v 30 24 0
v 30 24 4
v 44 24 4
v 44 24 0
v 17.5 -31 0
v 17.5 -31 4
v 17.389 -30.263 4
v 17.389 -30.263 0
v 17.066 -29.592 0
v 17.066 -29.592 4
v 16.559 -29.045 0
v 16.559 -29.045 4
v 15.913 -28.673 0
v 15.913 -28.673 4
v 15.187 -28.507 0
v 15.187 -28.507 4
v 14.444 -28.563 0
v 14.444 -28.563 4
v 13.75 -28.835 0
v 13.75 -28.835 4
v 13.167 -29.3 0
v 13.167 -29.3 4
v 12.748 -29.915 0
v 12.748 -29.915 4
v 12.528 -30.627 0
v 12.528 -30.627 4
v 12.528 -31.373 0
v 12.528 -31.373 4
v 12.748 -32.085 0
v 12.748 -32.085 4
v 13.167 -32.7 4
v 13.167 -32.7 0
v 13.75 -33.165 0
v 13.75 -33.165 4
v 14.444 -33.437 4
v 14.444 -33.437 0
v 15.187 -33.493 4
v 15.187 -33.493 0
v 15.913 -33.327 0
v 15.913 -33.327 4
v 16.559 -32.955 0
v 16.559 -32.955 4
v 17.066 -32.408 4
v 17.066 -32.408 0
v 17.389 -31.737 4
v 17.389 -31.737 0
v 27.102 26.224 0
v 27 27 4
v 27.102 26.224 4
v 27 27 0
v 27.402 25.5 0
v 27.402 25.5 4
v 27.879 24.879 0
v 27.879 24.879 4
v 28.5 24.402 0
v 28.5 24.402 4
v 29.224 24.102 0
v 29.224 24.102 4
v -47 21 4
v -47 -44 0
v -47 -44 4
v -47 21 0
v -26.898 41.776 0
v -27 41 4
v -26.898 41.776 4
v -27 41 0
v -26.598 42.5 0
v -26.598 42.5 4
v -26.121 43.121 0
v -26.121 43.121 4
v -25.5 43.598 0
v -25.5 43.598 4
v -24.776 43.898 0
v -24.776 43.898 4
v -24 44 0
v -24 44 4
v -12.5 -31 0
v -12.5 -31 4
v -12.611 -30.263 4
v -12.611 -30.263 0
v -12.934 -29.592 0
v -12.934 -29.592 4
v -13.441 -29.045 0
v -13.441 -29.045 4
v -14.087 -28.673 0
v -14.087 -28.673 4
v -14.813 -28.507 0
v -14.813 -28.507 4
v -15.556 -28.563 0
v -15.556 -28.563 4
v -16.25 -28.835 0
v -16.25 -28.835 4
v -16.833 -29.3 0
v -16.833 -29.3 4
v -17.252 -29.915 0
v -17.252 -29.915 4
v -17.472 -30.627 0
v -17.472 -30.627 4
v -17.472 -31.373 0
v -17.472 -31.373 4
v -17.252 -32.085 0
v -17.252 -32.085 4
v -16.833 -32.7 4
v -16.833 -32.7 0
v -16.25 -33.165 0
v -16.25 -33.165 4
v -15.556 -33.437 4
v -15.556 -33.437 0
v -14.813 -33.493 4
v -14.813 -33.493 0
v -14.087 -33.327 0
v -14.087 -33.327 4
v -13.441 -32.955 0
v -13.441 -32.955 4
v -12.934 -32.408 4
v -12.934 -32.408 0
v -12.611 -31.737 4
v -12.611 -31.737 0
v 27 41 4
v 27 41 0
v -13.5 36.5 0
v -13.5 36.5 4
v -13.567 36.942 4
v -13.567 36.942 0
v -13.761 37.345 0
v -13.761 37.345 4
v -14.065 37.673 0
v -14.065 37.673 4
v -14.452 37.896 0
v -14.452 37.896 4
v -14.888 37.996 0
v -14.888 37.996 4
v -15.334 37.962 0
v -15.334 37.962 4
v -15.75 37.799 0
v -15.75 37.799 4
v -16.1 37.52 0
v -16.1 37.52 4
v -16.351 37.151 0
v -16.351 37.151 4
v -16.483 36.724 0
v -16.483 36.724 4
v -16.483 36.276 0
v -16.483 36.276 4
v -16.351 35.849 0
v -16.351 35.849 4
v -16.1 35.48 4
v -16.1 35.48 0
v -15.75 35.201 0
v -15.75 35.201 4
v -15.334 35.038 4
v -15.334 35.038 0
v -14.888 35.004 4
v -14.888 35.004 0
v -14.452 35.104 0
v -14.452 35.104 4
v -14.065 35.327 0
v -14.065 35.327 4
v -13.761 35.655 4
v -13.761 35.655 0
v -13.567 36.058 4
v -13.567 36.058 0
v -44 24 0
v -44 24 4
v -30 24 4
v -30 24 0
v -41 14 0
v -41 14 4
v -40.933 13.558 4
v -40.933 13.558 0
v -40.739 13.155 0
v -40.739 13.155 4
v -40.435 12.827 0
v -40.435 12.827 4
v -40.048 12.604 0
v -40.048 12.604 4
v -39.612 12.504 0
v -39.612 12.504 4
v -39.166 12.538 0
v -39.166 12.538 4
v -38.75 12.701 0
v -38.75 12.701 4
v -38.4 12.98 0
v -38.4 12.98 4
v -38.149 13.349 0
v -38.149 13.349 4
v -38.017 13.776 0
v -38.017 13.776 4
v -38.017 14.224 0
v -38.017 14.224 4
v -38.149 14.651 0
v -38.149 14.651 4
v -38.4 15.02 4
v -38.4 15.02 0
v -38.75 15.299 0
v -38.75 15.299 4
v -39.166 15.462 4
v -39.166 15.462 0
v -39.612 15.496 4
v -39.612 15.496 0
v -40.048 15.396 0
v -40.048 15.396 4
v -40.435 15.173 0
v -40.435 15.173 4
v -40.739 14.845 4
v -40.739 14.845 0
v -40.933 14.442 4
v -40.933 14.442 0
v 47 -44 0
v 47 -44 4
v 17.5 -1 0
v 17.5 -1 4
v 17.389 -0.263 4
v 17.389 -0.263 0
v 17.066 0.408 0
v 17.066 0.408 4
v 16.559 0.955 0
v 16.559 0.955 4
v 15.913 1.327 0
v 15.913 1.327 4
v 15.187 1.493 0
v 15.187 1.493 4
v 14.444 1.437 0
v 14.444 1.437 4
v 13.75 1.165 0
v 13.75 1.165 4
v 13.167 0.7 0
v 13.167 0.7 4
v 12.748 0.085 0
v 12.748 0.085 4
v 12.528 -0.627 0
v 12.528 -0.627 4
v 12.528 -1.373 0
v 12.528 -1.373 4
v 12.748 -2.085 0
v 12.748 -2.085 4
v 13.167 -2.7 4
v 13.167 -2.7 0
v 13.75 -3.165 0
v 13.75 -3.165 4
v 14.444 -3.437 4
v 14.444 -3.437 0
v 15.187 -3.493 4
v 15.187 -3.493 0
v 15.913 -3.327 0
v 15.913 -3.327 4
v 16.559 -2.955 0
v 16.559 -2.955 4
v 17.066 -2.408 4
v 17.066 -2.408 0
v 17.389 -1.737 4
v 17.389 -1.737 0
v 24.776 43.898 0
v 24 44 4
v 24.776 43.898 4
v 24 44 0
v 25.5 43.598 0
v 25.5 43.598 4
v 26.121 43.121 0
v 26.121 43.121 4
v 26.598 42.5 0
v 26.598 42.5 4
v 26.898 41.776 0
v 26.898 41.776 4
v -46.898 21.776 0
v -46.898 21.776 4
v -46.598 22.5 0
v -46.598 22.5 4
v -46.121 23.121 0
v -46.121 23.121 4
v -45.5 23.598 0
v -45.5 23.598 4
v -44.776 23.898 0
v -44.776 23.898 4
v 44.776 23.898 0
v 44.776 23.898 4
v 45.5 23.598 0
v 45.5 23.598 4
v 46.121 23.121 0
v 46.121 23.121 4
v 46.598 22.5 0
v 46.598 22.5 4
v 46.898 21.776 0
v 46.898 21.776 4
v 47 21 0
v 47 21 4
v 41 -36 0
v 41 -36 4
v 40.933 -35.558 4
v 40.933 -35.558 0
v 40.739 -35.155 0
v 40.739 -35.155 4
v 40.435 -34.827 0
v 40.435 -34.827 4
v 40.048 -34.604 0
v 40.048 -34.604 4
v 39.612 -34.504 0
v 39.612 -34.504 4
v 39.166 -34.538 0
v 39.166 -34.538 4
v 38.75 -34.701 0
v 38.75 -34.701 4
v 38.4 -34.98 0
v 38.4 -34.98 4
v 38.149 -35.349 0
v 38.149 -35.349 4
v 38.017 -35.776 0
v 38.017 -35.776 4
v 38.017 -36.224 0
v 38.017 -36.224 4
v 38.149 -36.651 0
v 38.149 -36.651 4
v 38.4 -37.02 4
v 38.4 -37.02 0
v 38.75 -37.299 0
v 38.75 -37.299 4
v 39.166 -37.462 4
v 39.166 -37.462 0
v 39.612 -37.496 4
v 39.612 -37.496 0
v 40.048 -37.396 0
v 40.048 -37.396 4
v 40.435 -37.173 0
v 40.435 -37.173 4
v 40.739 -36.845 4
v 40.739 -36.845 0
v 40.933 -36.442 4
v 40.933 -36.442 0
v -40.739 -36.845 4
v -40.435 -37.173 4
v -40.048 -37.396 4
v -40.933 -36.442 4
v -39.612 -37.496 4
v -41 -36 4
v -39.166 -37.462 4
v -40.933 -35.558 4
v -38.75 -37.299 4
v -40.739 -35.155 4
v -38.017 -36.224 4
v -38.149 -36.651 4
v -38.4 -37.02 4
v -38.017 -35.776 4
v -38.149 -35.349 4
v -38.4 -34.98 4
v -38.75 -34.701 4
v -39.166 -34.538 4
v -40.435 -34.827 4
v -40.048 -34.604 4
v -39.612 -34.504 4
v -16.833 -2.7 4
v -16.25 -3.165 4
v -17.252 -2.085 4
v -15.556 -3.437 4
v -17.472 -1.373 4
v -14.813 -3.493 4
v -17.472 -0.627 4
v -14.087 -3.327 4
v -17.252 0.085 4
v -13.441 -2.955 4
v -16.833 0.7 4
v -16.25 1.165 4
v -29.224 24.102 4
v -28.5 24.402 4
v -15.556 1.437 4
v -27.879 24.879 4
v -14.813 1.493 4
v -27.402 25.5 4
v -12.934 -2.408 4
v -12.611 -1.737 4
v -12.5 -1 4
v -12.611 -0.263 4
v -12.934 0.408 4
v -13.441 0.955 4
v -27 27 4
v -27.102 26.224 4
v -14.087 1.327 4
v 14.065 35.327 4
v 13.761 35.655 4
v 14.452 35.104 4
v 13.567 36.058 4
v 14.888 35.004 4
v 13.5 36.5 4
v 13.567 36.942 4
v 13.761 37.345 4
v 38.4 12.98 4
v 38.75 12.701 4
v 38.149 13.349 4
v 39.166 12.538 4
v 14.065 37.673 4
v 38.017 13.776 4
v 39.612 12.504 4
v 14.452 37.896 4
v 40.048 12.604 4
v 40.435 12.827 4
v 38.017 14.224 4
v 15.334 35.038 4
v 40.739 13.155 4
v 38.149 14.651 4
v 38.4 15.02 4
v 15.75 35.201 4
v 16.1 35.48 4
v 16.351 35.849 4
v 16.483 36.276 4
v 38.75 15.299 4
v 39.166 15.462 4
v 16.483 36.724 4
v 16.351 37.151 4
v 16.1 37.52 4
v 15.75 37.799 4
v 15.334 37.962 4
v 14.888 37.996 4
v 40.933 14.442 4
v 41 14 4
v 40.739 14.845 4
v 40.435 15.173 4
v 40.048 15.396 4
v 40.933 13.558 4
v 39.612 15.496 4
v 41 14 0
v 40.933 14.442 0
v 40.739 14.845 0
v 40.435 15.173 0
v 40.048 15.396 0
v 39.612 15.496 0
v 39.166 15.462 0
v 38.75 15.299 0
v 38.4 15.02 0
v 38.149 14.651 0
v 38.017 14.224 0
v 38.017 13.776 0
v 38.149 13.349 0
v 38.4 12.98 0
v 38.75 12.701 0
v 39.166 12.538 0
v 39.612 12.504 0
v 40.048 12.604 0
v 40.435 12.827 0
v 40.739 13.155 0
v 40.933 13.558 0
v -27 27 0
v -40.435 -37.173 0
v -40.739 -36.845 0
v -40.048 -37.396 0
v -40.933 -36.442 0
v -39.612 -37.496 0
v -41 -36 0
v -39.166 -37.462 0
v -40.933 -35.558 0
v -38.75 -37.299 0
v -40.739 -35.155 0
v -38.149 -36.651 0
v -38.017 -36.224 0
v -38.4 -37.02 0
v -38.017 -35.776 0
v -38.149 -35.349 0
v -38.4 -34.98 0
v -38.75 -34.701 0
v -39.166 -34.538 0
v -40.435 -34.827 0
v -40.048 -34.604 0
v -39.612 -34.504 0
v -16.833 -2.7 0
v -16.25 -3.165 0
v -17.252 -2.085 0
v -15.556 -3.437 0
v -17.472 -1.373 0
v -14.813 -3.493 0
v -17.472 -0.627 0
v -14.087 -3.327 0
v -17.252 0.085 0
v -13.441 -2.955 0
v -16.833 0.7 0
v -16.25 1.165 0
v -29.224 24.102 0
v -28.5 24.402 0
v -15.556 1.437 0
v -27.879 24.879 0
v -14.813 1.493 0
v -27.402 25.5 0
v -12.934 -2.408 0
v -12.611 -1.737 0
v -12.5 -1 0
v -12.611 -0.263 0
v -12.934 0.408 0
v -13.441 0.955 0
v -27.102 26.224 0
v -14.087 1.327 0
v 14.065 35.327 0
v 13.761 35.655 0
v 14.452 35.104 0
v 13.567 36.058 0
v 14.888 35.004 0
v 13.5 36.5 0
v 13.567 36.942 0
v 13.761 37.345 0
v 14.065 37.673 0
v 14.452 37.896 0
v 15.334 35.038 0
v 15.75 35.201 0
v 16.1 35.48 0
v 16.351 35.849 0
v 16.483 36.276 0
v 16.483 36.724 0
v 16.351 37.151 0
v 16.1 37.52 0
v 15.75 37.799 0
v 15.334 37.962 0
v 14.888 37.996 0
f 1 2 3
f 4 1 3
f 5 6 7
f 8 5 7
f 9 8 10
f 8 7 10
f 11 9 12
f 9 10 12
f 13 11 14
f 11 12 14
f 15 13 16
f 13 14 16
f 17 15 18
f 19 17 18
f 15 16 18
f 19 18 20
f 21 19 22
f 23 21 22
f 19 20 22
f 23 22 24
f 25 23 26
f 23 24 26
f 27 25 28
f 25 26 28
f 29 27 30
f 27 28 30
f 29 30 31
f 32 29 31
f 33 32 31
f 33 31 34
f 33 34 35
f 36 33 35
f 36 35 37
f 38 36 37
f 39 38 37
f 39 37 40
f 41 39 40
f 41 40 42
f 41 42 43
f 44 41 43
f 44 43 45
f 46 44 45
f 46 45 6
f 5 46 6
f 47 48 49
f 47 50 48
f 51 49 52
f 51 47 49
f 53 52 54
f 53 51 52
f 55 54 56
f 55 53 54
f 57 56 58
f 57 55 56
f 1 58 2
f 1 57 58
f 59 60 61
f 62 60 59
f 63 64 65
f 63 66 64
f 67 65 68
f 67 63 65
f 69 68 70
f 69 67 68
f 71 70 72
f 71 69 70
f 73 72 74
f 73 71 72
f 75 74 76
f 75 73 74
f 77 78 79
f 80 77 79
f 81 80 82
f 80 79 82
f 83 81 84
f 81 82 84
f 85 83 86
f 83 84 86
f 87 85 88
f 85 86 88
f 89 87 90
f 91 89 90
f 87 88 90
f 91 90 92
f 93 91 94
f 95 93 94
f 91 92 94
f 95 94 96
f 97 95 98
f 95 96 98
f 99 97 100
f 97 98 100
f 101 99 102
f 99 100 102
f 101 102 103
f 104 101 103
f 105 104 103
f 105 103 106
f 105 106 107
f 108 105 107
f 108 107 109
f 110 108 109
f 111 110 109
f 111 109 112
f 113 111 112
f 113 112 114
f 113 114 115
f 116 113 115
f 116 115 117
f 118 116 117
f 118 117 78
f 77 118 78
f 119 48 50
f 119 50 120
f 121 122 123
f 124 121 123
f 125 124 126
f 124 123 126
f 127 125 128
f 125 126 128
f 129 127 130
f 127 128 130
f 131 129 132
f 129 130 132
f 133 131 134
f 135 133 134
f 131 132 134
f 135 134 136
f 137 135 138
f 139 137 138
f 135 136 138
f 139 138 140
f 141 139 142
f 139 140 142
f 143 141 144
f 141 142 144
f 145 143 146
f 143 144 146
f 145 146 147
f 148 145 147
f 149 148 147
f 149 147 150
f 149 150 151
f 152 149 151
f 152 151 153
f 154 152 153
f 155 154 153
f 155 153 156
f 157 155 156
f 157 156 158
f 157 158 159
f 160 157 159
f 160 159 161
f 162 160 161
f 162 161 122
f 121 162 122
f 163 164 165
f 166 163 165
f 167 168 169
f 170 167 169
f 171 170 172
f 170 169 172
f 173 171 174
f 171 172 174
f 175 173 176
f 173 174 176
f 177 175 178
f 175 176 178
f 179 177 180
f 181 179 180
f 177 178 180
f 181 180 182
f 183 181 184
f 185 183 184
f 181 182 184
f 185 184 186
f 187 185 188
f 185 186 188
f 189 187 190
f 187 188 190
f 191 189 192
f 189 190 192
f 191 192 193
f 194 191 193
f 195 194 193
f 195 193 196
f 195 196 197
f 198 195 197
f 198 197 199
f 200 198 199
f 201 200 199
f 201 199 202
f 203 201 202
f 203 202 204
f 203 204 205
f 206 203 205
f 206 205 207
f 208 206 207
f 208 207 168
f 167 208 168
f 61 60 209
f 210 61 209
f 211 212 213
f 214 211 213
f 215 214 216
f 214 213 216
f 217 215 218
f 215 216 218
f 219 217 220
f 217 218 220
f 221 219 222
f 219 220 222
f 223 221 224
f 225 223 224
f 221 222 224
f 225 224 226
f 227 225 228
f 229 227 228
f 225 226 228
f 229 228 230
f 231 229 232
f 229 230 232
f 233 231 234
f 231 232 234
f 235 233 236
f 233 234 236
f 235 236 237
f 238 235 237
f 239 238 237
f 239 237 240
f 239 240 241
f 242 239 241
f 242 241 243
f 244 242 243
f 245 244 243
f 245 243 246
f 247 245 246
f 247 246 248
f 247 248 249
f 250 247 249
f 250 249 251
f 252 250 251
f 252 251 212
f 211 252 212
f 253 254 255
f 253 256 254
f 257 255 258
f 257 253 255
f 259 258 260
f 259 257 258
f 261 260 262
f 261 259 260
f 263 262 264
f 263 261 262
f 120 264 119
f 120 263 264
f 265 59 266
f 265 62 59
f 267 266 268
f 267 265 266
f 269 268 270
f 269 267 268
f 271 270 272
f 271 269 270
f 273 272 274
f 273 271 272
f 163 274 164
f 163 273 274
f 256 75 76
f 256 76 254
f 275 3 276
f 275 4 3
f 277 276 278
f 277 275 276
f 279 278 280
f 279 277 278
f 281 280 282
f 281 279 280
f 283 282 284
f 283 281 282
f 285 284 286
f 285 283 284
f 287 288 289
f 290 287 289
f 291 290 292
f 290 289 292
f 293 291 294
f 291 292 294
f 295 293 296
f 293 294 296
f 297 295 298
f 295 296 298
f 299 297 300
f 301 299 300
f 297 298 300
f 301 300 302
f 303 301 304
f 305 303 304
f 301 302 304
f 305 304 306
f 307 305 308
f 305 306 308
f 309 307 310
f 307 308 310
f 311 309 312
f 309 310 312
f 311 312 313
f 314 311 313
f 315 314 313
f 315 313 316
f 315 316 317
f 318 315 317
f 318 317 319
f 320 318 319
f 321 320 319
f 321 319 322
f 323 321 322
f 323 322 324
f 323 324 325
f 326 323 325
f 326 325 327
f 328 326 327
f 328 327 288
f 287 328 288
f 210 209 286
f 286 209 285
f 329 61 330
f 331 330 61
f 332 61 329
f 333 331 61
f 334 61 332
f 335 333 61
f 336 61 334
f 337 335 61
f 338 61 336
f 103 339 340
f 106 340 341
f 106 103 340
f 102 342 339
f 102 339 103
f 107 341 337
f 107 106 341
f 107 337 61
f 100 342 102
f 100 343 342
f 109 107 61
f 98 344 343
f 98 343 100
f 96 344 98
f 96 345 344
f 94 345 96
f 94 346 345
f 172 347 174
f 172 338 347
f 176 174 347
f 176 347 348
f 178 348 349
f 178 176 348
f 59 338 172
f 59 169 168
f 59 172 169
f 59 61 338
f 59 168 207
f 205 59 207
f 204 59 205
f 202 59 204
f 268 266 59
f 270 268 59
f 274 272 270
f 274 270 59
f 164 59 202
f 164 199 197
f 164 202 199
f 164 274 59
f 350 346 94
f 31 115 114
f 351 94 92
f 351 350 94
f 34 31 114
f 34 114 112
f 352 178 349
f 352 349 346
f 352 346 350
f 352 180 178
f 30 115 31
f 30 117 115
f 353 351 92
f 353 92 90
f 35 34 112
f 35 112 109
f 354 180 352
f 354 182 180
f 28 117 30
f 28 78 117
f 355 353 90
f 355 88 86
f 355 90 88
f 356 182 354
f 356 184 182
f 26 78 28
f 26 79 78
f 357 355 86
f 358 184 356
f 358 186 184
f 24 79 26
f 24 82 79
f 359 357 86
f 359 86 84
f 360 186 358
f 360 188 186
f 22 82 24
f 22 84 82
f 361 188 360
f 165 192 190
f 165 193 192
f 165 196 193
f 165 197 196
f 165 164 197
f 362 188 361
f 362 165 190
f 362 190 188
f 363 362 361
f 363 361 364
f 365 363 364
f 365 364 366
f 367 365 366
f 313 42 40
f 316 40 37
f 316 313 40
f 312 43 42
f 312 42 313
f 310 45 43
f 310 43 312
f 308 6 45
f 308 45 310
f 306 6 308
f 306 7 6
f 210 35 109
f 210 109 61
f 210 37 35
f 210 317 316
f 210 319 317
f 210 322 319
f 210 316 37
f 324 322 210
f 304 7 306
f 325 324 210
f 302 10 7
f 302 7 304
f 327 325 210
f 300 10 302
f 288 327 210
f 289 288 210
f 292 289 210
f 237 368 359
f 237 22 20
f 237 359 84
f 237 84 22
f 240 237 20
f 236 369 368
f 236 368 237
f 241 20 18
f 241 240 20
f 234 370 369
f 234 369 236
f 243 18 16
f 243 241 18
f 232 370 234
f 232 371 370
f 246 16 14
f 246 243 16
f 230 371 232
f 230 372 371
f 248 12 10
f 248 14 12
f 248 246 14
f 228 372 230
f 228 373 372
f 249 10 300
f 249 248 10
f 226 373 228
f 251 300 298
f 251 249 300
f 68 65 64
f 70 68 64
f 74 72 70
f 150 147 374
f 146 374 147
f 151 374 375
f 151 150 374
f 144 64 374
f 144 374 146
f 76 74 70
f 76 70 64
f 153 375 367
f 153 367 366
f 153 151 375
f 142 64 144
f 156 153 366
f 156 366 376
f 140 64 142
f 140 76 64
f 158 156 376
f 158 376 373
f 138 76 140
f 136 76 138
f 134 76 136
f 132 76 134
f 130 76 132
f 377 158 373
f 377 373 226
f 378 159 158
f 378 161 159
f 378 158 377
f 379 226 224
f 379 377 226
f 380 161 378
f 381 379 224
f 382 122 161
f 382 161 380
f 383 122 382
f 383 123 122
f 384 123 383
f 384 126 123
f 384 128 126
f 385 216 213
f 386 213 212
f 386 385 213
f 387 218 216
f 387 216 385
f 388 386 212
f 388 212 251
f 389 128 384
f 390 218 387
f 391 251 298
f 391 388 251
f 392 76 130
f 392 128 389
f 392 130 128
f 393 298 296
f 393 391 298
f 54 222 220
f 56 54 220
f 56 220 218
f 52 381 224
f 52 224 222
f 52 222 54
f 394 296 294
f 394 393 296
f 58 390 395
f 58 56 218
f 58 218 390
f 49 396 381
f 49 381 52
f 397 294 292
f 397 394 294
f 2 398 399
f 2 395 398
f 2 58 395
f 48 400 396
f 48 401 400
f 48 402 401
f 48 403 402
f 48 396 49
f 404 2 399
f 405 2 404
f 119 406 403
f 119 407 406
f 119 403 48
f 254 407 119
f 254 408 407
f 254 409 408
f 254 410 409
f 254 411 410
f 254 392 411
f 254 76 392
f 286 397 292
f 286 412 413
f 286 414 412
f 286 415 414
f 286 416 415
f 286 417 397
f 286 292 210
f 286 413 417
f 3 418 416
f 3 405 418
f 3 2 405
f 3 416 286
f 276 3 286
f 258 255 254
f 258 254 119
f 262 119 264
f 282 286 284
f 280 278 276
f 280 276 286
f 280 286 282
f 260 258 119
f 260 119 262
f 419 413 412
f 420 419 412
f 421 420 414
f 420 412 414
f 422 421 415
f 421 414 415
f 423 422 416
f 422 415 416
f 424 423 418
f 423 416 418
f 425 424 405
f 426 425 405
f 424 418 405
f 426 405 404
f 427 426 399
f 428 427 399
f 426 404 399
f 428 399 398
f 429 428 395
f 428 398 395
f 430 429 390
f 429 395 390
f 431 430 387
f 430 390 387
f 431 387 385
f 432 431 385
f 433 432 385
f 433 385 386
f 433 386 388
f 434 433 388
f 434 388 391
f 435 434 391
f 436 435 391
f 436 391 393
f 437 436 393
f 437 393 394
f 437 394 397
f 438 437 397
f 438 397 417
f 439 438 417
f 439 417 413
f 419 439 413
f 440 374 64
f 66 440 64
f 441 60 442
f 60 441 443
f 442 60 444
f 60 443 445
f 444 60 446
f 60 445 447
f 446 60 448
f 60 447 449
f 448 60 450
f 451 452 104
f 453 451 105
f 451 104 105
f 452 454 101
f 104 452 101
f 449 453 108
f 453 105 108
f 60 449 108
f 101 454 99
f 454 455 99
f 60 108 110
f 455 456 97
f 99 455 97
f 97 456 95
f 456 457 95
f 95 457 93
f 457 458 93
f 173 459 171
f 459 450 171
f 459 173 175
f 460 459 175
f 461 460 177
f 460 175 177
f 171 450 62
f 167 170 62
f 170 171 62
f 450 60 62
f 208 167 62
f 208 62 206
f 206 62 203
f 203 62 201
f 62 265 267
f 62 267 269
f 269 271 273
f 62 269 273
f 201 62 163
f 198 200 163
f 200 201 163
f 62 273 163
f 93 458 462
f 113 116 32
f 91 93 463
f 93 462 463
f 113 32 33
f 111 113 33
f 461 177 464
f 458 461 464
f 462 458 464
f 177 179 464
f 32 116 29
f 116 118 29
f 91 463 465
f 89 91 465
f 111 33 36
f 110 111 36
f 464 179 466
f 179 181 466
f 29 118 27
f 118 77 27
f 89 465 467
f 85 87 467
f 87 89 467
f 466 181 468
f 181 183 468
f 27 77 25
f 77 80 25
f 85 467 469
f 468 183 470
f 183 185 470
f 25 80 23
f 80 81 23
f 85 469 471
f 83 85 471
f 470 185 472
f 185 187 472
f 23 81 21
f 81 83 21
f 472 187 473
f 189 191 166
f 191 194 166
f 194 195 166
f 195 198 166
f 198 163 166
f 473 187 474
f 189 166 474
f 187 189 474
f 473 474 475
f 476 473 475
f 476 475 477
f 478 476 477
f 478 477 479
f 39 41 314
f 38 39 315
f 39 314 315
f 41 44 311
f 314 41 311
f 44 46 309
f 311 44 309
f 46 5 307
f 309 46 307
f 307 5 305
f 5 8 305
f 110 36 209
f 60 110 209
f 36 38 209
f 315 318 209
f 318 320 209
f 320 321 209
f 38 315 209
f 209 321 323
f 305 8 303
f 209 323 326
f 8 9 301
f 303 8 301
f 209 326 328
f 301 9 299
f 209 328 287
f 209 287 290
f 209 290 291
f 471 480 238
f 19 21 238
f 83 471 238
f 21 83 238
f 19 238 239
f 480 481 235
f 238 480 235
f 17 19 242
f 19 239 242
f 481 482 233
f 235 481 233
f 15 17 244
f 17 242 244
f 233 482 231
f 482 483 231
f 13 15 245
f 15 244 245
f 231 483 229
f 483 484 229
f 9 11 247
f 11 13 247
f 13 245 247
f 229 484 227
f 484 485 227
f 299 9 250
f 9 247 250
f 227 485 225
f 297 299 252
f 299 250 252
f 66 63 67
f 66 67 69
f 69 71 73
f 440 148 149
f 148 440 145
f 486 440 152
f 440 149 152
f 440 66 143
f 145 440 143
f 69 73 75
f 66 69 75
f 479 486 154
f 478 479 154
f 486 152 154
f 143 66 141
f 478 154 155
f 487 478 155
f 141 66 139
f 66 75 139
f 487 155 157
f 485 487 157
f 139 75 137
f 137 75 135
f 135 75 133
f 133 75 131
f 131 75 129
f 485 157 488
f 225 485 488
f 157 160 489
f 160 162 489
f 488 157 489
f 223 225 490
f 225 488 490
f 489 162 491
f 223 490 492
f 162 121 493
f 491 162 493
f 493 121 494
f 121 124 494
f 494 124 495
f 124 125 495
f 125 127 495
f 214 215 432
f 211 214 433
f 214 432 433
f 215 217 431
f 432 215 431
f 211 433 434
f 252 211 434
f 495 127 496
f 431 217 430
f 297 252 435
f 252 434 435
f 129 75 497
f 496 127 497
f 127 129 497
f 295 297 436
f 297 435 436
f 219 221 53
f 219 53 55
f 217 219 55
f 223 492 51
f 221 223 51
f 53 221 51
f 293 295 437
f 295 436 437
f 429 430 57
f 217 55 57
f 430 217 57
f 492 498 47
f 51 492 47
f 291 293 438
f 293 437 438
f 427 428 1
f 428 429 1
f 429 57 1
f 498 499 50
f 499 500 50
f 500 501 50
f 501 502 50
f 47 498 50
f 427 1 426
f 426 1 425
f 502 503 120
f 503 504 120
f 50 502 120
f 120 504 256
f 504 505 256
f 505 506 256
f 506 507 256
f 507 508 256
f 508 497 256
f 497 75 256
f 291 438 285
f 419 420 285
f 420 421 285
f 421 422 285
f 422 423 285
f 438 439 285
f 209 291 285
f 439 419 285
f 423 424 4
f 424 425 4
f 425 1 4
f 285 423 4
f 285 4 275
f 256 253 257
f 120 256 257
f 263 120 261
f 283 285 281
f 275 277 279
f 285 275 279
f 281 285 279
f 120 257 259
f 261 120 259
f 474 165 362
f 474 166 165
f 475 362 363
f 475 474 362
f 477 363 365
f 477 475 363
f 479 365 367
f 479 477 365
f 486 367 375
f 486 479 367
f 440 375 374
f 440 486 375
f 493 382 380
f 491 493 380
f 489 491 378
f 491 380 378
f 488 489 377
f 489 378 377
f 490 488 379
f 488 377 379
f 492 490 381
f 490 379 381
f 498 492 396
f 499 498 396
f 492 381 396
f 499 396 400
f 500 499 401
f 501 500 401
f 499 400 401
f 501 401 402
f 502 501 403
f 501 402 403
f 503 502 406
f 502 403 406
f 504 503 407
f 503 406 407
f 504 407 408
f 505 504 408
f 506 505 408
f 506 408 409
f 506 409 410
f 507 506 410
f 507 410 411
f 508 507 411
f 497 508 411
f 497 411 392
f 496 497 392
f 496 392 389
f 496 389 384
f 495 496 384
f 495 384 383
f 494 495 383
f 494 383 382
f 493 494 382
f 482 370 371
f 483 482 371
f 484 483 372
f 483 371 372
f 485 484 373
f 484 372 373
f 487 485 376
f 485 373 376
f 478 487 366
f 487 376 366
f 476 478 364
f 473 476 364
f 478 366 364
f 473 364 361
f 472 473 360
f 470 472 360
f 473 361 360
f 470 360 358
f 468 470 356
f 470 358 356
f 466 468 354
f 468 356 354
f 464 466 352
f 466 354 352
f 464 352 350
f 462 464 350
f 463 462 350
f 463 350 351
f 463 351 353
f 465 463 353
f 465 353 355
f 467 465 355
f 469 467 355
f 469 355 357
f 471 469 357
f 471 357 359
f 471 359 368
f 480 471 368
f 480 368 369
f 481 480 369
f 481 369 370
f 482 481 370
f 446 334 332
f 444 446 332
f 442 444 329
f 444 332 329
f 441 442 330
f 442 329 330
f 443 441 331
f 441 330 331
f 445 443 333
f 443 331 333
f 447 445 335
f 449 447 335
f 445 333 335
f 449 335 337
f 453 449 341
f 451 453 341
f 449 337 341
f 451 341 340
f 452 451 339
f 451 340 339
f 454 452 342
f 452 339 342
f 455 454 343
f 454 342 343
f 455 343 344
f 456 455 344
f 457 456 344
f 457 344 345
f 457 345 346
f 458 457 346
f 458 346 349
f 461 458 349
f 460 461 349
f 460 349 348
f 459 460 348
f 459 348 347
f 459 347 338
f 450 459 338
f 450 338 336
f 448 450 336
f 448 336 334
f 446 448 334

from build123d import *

# Parameters (mm, degrees)
SKETCH_1_W          = 94
SKETCH_1_H          = 88
EXTRUDE_1_DEPTH     = 4
SKETCH_2_W          = 20
SKETCH_2_H          = 20
CUT_EXTRUDE_1_DEPTH = 65.505813691
FILLET_1_R          = 3
SKETCH_3_R          = 2.5
CUT_EXTRUDE_2_DEPTH = 65.505813691
SKETCH_4_R          = 1.5
CUT_EXTRUDE_3_DEPTH = 65.505813691


with BuildPart() as part:
    # 草图1 → 凸台-拉伸1 (new body)
    with BuildSketch(Plane.XY):
        Rectangle(SKETCH_1_W, SKETCH_1_H)
    extrude(amount=EXTRUDE_1_DEPTH)

    # 草图2 → 切除-拉伸1 (cut, through all)
    with BuildSketch(Plane.XY.offset(4)):
        with Locations((-37, 34)):
            Rectangle(SKETCH_2_W, SKETCH_2_H)
        with Locations((37, 34)):
            Rectangle(SKETCH_2_W, SKETCH_2_H)
    extrude(amount=-CUT_EXTRUDE_1_DEPTH, mode=Mode.SUBTRACT)

    # 圆角1
    fillet_1_edges = [part.edges().sort_by_distance(p)[0] for p in [
        (-47, 24, 2),
        (-27, 44, 2),
        (-27, 24, 2),
        (27, 44, 2),
        (47, 24, 2),
        (27, 24, 2),
    ]]
    fillet(fillet_1_edges, radius=FILLET_1_R)

    # 草图3 → 切除-拉伸2 (cut, through all)
    with BuildSketch(Plane.XY.offset(4)):
        with Locations((-15, -1)):
            Circle(SKETCH_3_R)
        with Locations((15, -1)):
            Circle(SKETCH_3_R)
        with Locations((15, -31)):
            Circle(SKETCH_3_R)
        with Locations((-15, -31)):
            Circle(SKETCH_3_R)
    extrude(amount=-CUT_EXTRUDE_2_DEPTH, mode=Mode.SUBTRACT)

    # 草图4 → 切除-拉伸3 (cut, through all)
    with BuildSketch(Plane.XY.offset(4)):
        with Locations((-15, 36.5)):
            Circle(SKETCH_4_R)
        with Locations((39.5, 14)):
            Circle(SKETCH_4_R)
        with Locations((39.5, -36)):
            Circle(SKETCH_4_R)
        with Locations(Location((15, 36.5, 0), (0, 0, 180))):
            Circle(SKETCH_4_R)
        with Locations(Location((-39.5, -36, 0), (0, 0, 180))):
            Circle(SKETCH_4_R)
        with Locations(Location((-39.5, 14, 0), (0, 0, 180))):
            Circle(SKETCH_4_R)
    extrude(amount=-CUT_EXTRUDE_3_DEPTH, mode=Mode.SUBTRACT)


solid = part.part
